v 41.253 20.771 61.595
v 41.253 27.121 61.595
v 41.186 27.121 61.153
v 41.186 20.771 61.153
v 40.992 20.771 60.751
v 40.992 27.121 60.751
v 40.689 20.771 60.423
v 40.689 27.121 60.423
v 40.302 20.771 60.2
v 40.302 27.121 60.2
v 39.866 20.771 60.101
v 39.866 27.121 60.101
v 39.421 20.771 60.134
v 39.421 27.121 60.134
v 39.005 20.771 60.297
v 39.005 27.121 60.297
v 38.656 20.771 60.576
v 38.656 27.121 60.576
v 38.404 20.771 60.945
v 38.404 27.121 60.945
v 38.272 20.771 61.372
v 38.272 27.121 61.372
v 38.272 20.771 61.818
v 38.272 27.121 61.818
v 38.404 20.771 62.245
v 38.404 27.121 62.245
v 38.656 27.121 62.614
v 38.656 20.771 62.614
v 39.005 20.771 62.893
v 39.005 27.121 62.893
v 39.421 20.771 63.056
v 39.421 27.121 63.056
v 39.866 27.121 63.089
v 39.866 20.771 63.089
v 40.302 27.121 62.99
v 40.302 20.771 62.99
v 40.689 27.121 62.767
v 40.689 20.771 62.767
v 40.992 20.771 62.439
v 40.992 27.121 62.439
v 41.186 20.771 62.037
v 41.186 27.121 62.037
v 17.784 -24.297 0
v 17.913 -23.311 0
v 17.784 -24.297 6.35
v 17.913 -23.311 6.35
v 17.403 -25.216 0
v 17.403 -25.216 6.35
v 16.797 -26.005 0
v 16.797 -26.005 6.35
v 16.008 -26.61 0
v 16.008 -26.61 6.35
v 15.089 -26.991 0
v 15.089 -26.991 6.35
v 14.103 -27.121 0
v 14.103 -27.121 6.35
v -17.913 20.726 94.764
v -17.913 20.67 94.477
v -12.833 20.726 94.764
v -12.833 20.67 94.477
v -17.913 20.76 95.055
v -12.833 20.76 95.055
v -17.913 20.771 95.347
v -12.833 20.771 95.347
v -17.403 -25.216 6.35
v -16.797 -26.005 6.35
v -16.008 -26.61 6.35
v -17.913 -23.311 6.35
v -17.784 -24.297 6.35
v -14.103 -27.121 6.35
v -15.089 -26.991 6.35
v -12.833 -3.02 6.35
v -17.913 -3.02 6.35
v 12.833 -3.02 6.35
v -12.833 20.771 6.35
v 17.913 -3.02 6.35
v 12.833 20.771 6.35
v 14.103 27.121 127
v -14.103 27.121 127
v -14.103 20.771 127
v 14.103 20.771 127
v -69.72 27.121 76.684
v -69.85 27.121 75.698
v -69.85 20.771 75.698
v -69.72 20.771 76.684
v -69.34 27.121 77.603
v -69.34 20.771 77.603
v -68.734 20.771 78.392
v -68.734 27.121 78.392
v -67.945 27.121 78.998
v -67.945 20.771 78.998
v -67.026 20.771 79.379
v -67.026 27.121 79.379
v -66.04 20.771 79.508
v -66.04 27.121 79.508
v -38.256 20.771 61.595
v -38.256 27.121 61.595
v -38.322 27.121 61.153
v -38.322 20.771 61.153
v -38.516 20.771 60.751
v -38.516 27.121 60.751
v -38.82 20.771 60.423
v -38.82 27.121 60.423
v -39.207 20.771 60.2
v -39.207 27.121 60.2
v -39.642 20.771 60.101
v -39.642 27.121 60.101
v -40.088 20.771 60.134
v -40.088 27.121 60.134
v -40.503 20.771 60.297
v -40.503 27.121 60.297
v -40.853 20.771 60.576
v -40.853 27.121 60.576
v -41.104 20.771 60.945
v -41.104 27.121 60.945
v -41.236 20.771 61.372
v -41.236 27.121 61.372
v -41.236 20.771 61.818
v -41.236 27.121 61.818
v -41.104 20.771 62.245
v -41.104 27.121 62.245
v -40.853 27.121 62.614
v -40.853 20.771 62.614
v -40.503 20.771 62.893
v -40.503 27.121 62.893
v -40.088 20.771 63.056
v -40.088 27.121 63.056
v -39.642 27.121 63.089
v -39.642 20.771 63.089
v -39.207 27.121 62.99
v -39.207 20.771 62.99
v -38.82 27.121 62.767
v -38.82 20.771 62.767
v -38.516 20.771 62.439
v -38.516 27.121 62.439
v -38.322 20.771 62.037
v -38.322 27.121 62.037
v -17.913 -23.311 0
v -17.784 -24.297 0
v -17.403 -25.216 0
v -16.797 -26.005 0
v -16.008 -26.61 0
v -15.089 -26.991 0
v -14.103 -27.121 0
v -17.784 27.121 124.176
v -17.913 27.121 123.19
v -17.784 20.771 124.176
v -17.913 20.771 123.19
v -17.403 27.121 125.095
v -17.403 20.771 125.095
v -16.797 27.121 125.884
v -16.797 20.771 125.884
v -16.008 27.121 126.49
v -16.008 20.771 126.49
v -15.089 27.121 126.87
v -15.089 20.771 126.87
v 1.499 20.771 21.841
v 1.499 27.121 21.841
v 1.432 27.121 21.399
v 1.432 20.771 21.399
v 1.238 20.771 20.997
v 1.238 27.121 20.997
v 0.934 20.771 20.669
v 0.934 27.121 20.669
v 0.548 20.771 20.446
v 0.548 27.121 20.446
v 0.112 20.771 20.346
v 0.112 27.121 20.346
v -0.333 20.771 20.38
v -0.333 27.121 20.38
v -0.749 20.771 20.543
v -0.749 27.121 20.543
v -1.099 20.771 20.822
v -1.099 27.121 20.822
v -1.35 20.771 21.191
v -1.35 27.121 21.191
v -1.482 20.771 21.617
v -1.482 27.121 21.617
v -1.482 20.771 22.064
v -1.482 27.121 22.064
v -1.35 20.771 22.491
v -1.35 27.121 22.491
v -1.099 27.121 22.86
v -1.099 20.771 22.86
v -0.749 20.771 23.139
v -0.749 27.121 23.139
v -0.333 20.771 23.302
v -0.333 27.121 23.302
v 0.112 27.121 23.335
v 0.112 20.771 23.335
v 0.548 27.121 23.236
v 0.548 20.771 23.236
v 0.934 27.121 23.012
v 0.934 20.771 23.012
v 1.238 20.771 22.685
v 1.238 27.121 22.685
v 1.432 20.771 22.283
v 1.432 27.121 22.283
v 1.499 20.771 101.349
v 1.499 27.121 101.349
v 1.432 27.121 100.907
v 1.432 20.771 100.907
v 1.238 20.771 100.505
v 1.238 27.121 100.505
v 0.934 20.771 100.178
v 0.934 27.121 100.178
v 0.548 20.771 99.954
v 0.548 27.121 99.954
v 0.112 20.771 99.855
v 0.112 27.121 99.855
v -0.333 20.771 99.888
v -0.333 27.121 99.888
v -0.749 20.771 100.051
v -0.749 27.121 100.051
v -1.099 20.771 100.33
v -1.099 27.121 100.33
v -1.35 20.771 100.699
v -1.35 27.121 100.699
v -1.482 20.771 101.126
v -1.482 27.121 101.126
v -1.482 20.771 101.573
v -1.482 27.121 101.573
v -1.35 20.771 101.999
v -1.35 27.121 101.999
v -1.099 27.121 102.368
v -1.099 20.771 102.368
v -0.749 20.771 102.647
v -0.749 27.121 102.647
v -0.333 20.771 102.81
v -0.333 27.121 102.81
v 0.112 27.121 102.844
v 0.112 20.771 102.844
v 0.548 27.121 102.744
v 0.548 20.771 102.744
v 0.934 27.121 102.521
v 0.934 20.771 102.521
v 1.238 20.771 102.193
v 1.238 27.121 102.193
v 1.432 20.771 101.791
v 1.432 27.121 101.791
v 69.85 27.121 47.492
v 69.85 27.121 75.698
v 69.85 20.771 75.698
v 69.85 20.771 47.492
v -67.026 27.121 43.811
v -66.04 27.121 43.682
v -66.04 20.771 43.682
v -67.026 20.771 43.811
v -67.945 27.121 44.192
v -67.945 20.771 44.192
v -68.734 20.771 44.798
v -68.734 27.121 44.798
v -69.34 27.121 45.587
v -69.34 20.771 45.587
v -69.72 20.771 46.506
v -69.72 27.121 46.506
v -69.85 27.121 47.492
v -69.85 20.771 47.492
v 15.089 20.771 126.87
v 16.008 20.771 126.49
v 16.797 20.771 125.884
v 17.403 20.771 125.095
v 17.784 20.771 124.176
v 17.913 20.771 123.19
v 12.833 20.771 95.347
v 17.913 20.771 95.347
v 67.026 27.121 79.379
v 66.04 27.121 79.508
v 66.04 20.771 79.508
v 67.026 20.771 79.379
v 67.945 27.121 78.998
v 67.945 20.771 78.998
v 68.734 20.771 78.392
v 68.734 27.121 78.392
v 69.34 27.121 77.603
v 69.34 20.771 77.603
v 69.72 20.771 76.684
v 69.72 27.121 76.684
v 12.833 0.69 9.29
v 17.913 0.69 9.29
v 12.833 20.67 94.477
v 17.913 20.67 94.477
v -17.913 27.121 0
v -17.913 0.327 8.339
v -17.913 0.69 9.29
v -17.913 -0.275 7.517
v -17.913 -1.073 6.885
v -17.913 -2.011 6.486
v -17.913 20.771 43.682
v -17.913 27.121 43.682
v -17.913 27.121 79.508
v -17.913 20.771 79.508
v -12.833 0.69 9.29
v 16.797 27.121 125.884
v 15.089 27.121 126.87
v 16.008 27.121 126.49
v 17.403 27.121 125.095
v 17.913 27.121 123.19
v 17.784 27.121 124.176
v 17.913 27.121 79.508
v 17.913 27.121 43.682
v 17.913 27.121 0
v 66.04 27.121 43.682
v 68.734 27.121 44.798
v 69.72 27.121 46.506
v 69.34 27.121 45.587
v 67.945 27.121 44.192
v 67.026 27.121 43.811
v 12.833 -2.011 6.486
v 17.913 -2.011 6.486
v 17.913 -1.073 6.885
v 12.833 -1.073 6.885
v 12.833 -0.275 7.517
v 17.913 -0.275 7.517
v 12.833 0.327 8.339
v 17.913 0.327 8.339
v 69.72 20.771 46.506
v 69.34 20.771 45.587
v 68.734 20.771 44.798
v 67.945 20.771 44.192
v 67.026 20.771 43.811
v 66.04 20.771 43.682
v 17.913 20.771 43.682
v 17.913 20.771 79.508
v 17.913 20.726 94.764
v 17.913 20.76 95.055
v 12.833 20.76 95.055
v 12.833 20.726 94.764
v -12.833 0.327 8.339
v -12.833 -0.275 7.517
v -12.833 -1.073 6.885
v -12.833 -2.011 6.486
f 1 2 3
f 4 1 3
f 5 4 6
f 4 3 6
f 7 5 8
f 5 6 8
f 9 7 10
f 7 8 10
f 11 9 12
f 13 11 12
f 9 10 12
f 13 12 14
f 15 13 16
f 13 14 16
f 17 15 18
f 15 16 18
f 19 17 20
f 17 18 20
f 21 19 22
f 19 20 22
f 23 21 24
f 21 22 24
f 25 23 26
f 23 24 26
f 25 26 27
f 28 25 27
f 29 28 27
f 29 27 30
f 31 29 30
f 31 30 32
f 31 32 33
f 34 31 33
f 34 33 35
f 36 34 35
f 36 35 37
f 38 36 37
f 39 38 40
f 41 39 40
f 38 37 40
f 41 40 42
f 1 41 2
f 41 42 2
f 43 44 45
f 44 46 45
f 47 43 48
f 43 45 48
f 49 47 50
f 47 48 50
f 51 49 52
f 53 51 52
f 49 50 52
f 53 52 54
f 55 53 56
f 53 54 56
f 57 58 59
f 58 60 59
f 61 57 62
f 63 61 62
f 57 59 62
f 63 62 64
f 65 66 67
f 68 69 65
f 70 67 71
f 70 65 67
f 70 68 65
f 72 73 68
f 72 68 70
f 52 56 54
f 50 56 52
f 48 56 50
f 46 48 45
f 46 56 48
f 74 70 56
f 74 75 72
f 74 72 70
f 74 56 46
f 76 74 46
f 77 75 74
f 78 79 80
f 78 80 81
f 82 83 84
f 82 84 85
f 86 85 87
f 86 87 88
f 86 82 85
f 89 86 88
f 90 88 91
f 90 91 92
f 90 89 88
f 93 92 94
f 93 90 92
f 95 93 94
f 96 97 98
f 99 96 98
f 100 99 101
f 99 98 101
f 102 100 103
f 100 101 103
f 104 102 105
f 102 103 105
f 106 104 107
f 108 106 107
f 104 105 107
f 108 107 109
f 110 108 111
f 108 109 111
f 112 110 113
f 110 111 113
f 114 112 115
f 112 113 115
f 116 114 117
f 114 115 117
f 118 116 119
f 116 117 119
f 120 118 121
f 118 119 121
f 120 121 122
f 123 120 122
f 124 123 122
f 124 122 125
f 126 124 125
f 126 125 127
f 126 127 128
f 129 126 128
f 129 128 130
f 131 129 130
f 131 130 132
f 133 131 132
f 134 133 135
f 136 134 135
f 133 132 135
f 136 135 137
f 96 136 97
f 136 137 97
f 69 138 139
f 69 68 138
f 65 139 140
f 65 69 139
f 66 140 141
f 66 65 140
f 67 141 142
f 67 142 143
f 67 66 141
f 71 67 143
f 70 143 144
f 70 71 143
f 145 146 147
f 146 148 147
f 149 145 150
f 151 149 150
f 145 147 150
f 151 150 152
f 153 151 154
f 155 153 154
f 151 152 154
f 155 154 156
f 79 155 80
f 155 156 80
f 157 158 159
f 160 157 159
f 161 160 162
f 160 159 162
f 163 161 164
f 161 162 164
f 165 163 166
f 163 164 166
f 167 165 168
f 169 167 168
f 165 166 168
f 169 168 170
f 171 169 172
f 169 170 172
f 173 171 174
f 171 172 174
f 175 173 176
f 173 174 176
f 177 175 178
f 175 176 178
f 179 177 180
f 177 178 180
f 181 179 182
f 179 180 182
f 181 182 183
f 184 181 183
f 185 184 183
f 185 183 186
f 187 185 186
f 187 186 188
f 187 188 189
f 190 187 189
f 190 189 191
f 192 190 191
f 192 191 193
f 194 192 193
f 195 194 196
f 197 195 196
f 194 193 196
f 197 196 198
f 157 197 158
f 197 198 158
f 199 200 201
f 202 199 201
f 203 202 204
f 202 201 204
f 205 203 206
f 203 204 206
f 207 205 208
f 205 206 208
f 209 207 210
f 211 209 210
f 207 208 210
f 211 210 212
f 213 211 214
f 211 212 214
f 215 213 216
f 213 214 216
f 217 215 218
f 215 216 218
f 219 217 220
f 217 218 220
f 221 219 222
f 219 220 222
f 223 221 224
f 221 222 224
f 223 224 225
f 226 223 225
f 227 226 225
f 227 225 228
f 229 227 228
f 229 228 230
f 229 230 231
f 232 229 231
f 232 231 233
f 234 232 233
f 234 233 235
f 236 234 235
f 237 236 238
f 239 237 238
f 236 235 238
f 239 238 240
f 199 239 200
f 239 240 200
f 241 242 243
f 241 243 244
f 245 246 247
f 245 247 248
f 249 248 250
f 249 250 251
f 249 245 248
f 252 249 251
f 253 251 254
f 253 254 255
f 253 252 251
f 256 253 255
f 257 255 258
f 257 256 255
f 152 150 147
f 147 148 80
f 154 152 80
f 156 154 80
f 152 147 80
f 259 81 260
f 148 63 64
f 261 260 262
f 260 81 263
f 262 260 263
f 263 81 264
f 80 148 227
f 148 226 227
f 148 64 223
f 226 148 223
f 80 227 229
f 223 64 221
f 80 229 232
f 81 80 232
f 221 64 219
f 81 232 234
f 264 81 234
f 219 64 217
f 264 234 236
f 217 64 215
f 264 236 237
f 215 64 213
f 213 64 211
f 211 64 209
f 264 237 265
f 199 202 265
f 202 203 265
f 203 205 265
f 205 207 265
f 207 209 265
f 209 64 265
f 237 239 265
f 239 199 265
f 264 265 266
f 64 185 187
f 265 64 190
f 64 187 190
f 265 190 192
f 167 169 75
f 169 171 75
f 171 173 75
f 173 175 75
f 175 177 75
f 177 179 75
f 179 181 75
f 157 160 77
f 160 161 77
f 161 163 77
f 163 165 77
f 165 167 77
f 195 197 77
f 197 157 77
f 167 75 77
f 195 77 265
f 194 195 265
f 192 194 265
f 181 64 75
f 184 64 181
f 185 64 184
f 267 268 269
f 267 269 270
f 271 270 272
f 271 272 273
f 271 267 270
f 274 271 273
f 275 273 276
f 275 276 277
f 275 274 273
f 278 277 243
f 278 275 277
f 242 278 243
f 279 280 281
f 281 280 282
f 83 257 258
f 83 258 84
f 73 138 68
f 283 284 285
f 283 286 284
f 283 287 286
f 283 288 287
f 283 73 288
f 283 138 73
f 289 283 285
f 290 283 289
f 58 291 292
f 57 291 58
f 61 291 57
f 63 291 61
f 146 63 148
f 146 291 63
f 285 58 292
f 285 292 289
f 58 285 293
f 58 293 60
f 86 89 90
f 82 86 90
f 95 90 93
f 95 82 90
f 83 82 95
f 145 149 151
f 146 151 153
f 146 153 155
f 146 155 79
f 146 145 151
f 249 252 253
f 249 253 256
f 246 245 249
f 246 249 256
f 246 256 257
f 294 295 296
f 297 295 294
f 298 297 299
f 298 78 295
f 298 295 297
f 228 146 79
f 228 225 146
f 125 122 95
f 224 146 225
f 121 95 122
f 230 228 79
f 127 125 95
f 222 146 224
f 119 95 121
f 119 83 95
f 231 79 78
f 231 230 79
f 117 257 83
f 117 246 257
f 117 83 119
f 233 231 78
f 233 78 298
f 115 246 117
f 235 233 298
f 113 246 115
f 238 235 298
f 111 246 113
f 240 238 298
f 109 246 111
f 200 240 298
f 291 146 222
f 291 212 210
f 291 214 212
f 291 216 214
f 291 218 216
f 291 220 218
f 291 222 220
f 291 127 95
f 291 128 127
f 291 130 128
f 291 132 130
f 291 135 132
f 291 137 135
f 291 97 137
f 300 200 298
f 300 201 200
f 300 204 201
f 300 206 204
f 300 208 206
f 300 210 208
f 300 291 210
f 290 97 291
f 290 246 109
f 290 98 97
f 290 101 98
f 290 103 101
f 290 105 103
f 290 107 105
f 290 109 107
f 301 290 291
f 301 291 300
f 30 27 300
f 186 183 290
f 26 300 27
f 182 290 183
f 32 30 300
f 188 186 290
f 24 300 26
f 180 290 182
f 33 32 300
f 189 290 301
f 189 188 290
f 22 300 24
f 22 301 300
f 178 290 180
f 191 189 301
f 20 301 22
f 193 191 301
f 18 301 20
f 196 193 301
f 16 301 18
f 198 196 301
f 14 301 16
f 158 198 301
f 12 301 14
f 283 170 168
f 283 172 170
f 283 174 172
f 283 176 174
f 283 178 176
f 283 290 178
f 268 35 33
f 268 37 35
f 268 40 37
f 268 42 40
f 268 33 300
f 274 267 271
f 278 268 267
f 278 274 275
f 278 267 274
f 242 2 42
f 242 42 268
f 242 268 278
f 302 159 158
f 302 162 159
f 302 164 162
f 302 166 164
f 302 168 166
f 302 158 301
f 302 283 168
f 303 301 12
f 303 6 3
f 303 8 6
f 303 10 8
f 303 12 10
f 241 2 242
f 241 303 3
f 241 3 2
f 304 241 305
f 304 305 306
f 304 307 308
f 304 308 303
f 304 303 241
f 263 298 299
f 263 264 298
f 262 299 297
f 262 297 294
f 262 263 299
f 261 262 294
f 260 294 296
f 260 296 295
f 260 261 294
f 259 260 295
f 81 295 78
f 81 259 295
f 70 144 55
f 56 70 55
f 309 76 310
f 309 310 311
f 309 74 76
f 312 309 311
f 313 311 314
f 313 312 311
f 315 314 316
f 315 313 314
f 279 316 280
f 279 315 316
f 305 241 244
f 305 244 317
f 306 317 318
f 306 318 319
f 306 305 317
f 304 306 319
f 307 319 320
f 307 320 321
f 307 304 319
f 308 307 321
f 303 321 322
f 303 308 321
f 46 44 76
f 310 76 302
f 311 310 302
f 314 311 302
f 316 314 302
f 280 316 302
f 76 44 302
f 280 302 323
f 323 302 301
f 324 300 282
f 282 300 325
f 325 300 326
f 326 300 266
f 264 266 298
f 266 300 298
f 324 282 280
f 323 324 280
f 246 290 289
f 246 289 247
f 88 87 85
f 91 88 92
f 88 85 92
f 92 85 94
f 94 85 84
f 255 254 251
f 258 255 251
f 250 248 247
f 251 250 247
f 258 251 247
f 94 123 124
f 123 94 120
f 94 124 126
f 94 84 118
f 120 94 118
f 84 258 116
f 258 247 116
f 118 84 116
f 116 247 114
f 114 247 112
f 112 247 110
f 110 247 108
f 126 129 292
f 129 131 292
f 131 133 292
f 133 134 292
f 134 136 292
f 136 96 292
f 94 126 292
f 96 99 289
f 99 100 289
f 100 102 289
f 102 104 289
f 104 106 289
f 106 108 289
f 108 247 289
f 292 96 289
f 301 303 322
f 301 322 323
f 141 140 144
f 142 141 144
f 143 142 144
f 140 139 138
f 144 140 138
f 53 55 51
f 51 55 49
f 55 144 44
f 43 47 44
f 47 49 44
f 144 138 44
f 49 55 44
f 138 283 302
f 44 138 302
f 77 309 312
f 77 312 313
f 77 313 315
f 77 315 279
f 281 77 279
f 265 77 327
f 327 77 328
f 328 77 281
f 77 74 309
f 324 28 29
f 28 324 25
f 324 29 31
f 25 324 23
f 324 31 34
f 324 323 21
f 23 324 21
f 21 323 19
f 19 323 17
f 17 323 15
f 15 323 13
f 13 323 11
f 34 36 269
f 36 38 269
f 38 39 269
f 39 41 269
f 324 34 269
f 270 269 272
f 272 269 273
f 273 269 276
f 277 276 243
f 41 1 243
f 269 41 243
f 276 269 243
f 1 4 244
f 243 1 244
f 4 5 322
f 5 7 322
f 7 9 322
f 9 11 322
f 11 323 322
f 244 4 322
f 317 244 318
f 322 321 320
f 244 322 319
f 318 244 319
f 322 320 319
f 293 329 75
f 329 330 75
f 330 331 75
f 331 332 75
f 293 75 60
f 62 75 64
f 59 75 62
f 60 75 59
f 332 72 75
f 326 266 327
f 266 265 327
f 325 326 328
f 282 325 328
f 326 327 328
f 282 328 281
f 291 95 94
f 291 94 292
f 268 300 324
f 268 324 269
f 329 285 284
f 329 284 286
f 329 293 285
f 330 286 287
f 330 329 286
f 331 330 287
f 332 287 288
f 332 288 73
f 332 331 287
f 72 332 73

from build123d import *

# Parameters (mm, degrees)
SKETCH1_W           = 35.8267
SKETCH1_H           = 54.2417
BOSS_EXTRUDE1_DEPTH = 6.35
SKETCH2_W           = 35.8267
SKETCH2_H           = 127
BOSS_EXTRUDE2_DEPTH = 6.35
BOSS_EXTRUDE3_DEPTH = 5.08
FILLET1_R           = 3.81
BOSS_EXTRUDE4_DEPTH = 6.35
SKETCH7_R           = 1.4986
CUT_EXTRUDE2_DEPTH  = 6.35


with BuildPart() as part:
    # Sketch1 → Boss-Extrude1 (new body)
    with BuildSketch(Plane.XY):
        Rectangle(SKETCH1_W, SKETCH1_H)
    extrude(amount=BOSS_EXTRUDE1_DEPTH)

    # Sketch2 → Boss-Extrude2 (add)
    with BuildSketch(Plane(origin=(0, 27.12085, 0), x_dir=(1, 0, 0), z_dir=(0, 1, 0))):
        with Locations((0, -63.5)):
            Rectangle(SKETCH2_W, SKETCH2_H)
    extrude(amount=-BOSS_EXTRUDE2_DEPTH)

    # Sketch4 → Boss-Extrude3 (add)
    with BuildSketch(Plane(origin=(17.91335, 0, 0), x_dir=(0, 0, -1), z_dir=(1, 0, 0))):
        Polygon((-6.35, 0), (-94.906446238, 20.77085), (-6.35, 20.77085), align=None)
    boss_extrude3 = extrude(amount=-BOSS_EXTRUDE3_DEPTH)

    # Mirror1: Boss-Extrude3 across plane
    add(boss_extrude3.mirror(Plane(origin=(0, 0, 0), x_dir=(0, 0, 1), z_dir=(1, 0, 0))))

    # Fillet1
    fillet1_edges = [part.edges().sort_by_distance(p)[0] for p in [
        (-17.91335, 23.94585, 127),
        (17.91335, 23.94585, 127),
        (15.37335, 0, 6.35),
        (15.37335, 20.77085, 94.906446238),
        (-15.37335, 0, 6.35),
        (-15.37335, 20.77085, 94.906446238),
        (17.91335, -27.12085, 3.175),
        (-17.91335, -27.12085, 3.175),
    ]]
    fillet(fillet1_edges, radius=FILLET1_R)

    # Sketch6 → Boss-Extrude4 (add)
    with BuildSketch(Plane(origin=(0, 27.12085, 0), x_dir=(1, 0, 0), z_dir=(0, 1, 0))):
        with BuildLine():
            Line((-66.04, -79.50835), (66.04, -79.50835))
            ThreePointArc((66.04, -79.50835), (68.734076836, -78.392426836), (69.85, -75.69835))
            Line((69.85, -75.69835), (69.85, -47.49165))
            ThreePointArc((69.85, -47.49165), (68.734076836, -44.797573164), (66.04, -43.68165))
            Line((66.04, -43.68165), (-66.04, -43.68165))
            ThreePointArc((-66.04, -43.68165), (-68.734076836, -44.797573164), (-69.85, -47.49165))
            Line((-69.85, -47.49165), (-69.85, -75.69835))
            ThreePointArc((-69.85, -75.69835), (-68.734076836, -78.392426836), (-66.04, -79.50835))
        make_face()
    extrude(amount=-BOSS_EXTRUDE4_DEPTH)

    # Sketch7 → Cut-Extrude2 (cut)
    with BuildSketch(Plane(origin=(0, 27.12085, 0), x_dir=(1, 0, 0), z_dir=(0, 1, 0))):
        with Locations((0, -21.840825)):
            Circle(SKETCH7_R)
        with Locations((39.754175, -61.595)):
            Circle(SKETCH7_R)
        with Locations((0, -101.349175)):
            Circle(SKETCH7_R)
        with Locations((-39.754175, -61.595)):
            Circle(SKETCH7_R)
    extrude(amount=-CUT_EXTRUDE2_DEPTH, mode=Mode.SUBTRACT)


solid = part.part
